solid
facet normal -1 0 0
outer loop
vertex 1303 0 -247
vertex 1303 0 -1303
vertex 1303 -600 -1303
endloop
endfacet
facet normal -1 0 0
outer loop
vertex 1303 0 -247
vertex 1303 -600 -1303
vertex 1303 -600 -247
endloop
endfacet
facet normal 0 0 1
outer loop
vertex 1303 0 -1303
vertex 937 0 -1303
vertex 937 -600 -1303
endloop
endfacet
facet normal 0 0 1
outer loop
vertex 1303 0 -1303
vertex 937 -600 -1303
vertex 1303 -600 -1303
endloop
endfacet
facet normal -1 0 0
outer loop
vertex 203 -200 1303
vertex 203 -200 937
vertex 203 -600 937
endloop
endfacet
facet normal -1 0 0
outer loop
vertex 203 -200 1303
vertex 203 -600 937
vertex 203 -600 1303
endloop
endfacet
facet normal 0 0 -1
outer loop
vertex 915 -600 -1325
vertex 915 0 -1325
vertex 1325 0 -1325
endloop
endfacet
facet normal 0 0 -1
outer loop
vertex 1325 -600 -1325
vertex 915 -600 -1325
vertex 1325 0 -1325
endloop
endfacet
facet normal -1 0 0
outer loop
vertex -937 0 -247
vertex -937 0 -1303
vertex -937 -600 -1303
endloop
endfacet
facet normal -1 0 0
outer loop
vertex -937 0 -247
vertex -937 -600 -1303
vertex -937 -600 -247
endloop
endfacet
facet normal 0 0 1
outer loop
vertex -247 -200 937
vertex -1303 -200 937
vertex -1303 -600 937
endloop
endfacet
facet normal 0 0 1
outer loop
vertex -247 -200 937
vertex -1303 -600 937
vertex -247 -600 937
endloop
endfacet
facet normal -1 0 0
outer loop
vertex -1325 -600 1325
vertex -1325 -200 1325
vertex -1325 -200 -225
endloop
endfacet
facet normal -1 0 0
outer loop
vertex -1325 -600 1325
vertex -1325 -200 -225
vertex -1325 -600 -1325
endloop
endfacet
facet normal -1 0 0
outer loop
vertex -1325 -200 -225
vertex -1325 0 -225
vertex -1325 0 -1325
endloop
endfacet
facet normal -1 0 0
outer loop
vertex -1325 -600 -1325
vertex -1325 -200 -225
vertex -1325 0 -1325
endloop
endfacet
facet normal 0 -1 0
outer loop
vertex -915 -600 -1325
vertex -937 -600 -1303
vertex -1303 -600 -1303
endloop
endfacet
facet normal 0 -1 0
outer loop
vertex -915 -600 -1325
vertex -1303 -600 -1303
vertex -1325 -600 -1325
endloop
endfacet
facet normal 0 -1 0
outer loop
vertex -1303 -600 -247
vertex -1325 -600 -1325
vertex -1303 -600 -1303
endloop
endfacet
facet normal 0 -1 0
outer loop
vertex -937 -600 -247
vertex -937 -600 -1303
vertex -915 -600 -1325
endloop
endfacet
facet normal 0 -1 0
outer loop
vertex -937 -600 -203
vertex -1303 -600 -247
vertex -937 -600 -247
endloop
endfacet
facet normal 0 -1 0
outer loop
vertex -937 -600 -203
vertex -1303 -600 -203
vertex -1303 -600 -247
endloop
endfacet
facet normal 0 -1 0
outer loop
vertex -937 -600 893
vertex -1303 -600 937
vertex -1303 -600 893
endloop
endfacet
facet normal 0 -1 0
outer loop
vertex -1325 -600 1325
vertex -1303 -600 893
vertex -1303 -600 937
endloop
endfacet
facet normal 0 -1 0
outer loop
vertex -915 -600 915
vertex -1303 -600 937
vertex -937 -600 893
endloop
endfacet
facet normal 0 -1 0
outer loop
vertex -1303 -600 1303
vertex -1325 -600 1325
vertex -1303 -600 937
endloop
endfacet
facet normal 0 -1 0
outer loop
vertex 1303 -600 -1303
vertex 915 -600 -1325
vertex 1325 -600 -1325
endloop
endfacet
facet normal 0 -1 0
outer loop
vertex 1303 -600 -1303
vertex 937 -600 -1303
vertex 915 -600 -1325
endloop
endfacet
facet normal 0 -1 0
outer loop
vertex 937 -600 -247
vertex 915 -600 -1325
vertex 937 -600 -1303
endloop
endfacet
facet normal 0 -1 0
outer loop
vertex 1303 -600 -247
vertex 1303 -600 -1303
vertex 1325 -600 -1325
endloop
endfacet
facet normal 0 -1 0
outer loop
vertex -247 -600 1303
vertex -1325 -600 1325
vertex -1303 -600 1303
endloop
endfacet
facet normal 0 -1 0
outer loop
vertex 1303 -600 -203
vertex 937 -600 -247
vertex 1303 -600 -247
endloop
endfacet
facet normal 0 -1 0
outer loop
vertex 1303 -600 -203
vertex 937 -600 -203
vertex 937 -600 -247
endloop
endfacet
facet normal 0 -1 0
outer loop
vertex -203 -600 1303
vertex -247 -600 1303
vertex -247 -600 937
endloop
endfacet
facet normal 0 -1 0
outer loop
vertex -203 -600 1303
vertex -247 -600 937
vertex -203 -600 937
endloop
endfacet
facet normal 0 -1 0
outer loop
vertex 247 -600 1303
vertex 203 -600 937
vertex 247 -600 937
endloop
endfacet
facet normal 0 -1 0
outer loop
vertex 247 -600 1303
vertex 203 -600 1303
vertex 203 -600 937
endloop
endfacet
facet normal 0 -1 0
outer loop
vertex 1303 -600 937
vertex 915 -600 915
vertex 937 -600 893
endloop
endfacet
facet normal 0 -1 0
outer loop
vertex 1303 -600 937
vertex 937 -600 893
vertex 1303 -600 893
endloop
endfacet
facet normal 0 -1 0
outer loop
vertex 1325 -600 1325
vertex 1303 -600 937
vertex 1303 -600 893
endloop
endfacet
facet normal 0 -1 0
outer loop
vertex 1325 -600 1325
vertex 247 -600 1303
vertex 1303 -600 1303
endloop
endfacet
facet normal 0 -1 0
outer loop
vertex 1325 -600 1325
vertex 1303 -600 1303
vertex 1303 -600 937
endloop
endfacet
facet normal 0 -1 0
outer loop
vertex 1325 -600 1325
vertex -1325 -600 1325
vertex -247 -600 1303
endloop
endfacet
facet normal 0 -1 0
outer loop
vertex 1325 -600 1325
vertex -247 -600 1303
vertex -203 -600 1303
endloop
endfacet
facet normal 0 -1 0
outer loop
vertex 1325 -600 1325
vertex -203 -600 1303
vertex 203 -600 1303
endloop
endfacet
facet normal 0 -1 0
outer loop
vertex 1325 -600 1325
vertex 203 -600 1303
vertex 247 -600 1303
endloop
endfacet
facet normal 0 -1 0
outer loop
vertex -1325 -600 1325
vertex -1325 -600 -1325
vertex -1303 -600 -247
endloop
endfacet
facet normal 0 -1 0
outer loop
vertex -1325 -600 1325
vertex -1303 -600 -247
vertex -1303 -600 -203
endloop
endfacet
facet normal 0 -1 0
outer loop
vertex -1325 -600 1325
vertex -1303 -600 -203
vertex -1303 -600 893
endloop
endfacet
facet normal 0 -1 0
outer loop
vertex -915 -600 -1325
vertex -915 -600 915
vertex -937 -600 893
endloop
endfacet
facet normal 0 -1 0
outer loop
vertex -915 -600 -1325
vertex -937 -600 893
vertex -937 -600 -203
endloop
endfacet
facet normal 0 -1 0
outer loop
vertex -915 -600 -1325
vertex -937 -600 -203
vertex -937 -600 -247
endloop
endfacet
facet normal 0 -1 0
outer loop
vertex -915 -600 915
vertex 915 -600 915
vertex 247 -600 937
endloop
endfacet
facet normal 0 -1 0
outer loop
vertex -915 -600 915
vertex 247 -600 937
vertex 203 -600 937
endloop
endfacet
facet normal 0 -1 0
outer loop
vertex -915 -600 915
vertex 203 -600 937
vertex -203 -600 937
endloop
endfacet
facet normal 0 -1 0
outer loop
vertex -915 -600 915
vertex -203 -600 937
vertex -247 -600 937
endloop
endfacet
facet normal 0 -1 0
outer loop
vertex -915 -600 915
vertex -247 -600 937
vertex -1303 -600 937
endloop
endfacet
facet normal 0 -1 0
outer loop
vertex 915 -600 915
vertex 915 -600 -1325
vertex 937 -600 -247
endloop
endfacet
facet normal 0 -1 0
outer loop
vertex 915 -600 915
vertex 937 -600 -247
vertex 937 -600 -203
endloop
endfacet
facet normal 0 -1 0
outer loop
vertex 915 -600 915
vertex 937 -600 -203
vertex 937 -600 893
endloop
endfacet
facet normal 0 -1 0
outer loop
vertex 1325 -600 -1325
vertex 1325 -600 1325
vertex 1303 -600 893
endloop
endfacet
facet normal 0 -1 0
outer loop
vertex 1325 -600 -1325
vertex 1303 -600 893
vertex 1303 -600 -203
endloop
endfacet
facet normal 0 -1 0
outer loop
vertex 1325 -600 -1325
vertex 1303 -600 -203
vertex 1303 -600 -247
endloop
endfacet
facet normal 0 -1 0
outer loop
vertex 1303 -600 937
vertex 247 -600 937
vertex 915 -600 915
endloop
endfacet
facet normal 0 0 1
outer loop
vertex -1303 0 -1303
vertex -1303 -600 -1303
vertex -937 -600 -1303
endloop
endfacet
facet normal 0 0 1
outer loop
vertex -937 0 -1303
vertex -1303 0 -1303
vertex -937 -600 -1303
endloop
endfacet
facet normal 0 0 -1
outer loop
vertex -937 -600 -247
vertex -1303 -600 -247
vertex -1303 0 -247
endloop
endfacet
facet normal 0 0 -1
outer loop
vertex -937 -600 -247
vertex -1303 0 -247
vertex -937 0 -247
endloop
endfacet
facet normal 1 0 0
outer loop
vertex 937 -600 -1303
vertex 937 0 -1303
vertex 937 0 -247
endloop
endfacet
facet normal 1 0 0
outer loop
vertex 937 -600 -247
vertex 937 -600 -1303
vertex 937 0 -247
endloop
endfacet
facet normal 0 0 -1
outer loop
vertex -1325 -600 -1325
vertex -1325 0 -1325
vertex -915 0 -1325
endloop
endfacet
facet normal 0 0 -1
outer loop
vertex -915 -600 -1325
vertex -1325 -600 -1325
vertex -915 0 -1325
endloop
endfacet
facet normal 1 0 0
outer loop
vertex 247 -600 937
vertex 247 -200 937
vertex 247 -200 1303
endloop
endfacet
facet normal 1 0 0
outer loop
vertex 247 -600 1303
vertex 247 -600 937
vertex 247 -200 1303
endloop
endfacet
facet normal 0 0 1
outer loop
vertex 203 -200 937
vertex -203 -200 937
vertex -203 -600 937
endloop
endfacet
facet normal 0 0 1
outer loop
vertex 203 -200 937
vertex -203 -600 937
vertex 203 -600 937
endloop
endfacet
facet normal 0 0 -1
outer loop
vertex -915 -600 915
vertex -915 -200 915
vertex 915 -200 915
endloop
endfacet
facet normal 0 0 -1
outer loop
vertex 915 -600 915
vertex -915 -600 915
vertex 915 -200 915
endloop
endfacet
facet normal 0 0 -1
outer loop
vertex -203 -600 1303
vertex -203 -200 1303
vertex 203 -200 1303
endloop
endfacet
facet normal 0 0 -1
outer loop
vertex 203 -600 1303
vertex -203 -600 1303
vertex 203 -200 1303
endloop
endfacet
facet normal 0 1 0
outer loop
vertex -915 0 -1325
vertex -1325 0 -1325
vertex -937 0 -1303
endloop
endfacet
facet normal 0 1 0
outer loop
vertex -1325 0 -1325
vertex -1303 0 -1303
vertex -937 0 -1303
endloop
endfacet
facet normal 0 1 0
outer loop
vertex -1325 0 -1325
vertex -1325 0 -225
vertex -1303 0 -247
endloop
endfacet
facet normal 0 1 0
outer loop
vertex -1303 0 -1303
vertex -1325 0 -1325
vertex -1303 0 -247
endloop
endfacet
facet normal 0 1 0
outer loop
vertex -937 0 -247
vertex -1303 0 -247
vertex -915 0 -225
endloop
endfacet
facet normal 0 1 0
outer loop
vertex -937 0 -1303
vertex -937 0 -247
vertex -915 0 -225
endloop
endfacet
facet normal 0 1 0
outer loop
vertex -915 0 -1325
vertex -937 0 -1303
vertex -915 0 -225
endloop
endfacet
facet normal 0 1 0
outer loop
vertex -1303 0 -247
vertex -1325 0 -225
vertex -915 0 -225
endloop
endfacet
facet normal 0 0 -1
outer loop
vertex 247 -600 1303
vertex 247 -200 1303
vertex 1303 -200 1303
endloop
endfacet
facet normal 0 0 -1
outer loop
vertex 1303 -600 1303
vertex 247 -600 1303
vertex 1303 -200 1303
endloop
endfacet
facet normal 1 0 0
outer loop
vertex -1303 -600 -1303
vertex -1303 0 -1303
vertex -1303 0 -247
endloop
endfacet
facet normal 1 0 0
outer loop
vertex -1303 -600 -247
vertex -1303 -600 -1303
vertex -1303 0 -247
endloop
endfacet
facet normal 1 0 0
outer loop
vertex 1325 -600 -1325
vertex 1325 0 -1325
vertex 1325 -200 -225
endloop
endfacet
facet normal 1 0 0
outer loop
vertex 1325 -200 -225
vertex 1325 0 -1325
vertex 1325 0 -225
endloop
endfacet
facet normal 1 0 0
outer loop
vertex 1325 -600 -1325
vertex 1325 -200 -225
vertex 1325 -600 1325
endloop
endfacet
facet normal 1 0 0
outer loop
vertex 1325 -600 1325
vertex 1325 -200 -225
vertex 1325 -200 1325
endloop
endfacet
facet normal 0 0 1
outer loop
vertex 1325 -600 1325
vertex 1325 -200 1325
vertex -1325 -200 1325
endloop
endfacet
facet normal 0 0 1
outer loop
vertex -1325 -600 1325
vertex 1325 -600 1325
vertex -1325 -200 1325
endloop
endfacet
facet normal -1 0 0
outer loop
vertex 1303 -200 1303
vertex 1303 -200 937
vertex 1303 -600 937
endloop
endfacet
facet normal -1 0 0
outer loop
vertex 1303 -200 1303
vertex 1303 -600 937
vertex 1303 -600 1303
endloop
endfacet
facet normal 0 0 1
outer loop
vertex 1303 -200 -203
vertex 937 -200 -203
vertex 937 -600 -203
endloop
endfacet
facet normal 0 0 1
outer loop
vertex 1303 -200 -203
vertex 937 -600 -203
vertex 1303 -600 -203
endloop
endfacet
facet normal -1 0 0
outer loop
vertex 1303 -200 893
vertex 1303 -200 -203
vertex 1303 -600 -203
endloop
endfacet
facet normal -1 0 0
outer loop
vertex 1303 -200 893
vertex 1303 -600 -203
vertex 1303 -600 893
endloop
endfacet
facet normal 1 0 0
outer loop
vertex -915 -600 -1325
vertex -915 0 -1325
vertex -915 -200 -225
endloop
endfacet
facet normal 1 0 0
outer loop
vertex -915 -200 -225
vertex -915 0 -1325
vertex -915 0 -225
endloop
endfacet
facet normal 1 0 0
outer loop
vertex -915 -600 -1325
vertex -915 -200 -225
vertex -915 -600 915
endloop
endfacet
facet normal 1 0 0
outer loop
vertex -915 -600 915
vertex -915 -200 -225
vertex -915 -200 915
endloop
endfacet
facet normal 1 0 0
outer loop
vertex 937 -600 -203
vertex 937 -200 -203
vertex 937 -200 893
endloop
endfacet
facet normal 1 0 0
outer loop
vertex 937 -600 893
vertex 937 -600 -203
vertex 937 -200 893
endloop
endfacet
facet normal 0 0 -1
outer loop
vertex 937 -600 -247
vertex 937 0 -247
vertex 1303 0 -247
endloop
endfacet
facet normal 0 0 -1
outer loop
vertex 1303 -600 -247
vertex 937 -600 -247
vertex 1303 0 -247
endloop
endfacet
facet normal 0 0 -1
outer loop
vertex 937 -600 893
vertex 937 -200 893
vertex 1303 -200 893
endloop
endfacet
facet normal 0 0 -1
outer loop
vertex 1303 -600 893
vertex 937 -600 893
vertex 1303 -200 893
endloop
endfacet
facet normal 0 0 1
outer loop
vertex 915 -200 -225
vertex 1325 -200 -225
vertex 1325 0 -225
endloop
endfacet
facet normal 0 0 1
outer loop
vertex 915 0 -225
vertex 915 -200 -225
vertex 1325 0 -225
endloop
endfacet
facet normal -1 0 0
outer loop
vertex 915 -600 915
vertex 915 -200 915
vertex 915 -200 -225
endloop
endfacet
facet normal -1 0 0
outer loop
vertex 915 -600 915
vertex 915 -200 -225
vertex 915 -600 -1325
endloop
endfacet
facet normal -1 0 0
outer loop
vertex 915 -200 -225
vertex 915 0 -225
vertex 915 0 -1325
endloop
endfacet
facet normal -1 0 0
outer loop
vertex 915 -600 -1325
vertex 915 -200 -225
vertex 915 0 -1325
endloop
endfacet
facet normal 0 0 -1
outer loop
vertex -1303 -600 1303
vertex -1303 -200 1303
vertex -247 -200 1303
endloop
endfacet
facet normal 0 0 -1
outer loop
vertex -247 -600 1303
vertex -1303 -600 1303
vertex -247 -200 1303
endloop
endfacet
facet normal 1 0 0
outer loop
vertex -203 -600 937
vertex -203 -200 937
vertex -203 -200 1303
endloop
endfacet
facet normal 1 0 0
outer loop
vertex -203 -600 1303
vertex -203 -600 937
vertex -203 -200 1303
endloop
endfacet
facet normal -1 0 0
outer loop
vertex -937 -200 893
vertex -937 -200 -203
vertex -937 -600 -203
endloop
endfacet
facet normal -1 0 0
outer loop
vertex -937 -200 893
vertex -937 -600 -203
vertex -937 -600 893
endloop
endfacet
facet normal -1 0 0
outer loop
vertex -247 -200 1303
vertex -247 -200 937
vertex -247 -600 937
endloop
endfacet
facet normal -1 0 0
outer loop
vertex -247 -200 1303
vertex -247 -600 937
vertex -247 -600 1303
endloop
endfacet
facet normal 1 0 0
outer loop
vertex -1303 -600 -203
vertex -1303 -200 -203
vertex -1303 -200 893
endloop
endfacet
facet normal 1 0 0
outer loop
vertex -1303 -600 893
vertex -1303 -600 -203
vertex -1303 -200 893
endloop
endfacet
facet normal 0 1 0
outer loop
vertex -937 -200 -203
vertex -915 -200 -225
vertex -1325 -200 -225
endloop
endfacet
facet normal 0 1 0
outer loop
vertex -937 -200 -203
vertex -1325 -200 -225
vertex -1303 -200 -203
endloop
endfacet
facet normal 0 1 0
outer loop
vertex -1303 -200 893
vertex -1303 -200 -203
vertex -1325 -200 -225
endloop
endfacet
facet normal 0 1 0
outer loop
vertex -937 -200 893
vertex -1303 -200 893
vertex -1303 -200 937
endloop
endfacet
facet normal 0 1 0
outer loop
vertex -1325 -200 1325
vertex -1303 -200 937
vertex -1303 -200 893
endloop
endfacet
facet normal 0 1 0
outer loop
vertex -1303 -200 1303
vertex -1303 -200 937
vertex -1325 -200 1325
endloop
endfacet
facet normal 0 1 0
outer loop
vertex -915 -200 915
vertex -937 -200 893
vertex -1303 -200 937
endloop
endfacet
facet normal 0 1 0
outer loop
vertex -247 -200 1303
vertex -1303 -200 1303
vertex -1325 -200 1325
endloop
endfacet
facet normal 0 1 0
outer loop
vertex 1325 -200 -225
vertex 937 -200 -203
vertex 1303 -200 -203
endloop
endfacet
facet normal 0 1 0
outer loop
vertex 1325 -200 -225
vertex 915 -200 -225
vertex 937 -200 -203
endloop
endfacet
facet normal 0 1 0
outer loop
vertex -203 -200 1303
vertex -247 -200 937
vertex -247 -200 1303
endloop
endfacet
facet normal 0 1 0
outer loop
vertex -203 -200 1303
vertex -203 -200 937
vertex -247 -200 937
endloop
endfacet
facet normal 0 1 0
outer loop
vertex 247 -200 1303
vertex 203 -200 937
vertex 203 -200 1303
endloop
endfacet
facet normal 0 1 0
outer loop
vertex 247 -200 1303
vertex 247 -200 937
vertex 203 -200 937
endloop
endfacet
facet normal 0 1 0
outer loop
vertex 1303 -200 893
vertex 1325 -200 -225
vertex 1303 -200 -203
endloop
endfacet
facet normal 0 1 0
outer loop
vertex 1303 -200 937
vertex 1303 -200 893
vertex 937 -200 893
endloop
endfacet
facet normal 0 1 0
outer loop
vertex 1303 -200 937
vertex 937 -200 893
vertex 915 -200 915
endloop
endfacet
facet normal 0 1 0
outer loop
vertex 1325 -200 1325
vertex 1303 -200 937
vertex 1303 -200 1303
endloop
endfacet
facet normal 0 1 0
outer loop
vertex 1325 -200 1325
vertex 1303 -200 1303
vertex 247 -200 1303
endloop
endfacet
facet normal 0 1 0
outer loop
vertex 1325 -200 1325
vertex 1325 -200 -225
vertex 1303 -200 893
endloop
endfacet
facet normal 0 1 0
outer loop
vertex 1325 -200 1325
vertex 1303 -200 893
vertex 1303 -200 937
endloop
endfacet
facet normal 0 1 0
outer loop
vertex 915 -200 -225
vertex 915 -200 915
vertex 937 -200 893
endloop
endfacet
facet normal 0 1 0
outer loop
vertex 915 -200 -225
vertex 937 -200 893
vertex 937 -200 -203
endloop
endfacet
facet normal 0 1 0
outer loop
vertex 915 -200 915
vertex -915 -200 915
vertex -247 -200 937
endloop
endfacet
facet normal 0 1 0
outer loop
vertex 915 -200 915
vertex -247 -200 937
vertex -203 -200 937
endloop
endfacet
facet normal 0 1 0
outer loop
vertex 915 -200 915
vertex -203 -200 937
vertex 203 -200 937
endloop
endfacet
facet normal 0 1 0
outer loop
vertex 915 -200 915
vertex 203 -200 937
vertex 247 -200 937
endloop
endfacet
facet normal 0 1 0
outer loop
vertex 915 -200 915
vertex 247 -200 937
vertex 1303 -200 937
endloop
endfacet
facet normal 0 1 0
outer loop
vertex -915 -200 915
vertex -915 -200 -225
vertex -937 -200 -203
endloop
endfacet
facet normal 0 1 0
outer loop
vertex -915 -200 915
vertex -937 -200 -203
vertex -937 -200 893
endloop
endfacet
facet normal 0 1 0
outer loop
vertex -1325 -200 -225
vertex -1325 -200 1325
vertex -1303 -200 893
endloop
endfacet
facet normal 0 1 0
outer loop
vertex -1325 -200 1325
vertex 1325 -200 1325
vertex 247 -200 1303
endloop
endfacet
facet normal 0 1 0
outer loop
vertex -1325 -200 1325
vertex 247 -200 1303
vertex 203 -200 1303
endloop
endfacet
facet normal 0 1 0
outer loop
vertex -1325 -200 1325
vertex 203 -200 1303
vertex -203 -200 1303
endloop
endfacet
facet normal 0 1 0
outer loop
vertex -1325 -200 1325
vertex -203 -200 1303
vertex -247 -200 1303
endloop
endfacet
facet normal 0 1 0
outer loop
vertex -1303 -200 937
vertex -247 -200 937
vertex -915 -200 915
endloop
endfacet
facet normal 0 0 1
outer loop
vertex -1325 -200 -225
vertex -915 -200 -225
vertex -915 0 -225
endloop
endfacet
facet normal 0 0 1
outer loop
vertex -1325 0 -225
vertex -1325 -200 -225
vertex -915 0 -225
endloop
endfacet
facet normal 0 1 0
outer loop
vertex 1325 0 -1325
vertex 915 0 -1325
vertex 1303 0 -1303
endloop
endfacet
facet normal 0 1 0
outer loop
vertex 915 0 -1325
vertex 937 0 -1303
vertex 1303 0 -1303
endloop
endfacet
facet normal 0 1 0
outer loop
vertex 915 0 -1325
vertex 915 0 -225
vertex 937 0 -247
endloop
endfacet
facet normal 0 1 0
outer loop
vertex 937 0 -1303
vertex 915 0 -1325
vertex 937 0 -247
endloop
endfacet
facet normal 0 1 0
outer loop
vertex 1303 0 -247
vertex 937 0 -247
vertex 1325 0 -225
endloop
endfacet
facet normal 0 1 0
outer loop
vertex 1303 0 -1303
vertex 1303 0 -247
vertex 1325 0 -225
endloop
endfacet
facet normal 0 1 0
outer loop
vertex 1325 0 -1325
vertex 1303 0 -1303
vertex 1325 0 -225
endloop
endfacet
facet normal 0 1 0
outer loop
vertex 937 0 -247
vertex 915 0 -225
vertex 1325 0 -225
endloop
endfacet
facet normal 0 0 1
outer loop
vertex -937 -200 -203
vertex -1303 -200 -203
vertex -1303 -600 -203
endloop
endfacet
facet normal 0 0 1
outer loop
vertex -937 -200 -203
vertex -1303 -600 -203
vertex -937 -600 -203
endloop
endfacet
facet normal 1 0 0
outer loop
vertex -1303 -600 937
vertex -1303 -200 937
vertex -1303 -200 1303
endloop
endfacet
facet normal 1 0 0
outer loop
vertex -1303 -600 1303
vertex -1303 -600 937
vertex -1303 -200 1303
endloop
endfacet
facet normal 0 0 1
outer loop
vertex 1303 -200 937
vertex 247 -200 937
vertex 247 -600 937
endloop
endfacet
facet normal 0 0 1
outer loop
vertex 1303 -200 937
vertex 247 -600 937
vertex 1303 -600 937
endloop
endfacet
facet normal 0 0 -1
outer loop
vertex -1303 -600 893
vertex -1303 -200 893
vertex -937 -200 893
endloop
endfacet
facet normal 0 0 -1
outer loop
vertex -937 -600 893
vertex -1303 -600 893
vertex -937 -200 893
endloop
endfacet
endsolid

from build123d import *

# Parameters (mm, degrees)
F0_W     = 366
F0_H     = 1056
F0_H_2   = 1096
F0_W_2   = 1056
F0_H_3   = 366
F0_W_3   = 406
F1_DEPTH = 600
F2_W     = 200
F2_H     = 1550
F3_DEPTH = 2650.001


with BuildPart() as f1:
    # F0 (on Front) → F1 (new body)
    with BuildSketch(Plane.XZ):
        Polygon((1325, 1325), (-1325, 1325), (-1325, -1325), (-915, -1325), (-915, 915), (915, 915), (915, -203), (915, -1325), (1325, -1325), (1325, -203), align=None)
        with Locations((-1120, -775)):
            Rectangle(F0_W, F0_H, mode=Mode.SUBTRACT)
        with Locations((1120, -775)):
            Rectangle(F0_W, F0_H, mode=Mode.SUBTRACT)
        with Locations((-1120, 345)):
            Rectangle(F0_W, F0_H_2, mode=Mode.SUBTRACT)
        with Locations((-775, 1120)):
            Rectangle(F0_W_2, F0_H_3, mode=Mode.SUBTRACT)
        with Locations((1120, 345)):
            Rectangle(F0_W, F0_H_2, mode=Mode.SUBTRACT)
        with Locations((0, 1120)):
            Rectangle(F0_W_3, F0_H_3, mode=Mode.SUBTRACT)
        with Locations((775, 1120)):
            Rectangle(F0_W_2, F0_H_3, mode=Mode.SUBTRACT)
    extrude(amount=F1_DEPTH)

    # F2 (on face) → F3 (cut, through all)
    with BuildSketch(Plane.YZ.offset(1325)):
        with Locations((-100, 550)):
            Rectangle(F2_W, F2_H)
    extrude(amount=-F3_DEPTH, mode=Mode.SUBTRACT)


solid = f1.part
